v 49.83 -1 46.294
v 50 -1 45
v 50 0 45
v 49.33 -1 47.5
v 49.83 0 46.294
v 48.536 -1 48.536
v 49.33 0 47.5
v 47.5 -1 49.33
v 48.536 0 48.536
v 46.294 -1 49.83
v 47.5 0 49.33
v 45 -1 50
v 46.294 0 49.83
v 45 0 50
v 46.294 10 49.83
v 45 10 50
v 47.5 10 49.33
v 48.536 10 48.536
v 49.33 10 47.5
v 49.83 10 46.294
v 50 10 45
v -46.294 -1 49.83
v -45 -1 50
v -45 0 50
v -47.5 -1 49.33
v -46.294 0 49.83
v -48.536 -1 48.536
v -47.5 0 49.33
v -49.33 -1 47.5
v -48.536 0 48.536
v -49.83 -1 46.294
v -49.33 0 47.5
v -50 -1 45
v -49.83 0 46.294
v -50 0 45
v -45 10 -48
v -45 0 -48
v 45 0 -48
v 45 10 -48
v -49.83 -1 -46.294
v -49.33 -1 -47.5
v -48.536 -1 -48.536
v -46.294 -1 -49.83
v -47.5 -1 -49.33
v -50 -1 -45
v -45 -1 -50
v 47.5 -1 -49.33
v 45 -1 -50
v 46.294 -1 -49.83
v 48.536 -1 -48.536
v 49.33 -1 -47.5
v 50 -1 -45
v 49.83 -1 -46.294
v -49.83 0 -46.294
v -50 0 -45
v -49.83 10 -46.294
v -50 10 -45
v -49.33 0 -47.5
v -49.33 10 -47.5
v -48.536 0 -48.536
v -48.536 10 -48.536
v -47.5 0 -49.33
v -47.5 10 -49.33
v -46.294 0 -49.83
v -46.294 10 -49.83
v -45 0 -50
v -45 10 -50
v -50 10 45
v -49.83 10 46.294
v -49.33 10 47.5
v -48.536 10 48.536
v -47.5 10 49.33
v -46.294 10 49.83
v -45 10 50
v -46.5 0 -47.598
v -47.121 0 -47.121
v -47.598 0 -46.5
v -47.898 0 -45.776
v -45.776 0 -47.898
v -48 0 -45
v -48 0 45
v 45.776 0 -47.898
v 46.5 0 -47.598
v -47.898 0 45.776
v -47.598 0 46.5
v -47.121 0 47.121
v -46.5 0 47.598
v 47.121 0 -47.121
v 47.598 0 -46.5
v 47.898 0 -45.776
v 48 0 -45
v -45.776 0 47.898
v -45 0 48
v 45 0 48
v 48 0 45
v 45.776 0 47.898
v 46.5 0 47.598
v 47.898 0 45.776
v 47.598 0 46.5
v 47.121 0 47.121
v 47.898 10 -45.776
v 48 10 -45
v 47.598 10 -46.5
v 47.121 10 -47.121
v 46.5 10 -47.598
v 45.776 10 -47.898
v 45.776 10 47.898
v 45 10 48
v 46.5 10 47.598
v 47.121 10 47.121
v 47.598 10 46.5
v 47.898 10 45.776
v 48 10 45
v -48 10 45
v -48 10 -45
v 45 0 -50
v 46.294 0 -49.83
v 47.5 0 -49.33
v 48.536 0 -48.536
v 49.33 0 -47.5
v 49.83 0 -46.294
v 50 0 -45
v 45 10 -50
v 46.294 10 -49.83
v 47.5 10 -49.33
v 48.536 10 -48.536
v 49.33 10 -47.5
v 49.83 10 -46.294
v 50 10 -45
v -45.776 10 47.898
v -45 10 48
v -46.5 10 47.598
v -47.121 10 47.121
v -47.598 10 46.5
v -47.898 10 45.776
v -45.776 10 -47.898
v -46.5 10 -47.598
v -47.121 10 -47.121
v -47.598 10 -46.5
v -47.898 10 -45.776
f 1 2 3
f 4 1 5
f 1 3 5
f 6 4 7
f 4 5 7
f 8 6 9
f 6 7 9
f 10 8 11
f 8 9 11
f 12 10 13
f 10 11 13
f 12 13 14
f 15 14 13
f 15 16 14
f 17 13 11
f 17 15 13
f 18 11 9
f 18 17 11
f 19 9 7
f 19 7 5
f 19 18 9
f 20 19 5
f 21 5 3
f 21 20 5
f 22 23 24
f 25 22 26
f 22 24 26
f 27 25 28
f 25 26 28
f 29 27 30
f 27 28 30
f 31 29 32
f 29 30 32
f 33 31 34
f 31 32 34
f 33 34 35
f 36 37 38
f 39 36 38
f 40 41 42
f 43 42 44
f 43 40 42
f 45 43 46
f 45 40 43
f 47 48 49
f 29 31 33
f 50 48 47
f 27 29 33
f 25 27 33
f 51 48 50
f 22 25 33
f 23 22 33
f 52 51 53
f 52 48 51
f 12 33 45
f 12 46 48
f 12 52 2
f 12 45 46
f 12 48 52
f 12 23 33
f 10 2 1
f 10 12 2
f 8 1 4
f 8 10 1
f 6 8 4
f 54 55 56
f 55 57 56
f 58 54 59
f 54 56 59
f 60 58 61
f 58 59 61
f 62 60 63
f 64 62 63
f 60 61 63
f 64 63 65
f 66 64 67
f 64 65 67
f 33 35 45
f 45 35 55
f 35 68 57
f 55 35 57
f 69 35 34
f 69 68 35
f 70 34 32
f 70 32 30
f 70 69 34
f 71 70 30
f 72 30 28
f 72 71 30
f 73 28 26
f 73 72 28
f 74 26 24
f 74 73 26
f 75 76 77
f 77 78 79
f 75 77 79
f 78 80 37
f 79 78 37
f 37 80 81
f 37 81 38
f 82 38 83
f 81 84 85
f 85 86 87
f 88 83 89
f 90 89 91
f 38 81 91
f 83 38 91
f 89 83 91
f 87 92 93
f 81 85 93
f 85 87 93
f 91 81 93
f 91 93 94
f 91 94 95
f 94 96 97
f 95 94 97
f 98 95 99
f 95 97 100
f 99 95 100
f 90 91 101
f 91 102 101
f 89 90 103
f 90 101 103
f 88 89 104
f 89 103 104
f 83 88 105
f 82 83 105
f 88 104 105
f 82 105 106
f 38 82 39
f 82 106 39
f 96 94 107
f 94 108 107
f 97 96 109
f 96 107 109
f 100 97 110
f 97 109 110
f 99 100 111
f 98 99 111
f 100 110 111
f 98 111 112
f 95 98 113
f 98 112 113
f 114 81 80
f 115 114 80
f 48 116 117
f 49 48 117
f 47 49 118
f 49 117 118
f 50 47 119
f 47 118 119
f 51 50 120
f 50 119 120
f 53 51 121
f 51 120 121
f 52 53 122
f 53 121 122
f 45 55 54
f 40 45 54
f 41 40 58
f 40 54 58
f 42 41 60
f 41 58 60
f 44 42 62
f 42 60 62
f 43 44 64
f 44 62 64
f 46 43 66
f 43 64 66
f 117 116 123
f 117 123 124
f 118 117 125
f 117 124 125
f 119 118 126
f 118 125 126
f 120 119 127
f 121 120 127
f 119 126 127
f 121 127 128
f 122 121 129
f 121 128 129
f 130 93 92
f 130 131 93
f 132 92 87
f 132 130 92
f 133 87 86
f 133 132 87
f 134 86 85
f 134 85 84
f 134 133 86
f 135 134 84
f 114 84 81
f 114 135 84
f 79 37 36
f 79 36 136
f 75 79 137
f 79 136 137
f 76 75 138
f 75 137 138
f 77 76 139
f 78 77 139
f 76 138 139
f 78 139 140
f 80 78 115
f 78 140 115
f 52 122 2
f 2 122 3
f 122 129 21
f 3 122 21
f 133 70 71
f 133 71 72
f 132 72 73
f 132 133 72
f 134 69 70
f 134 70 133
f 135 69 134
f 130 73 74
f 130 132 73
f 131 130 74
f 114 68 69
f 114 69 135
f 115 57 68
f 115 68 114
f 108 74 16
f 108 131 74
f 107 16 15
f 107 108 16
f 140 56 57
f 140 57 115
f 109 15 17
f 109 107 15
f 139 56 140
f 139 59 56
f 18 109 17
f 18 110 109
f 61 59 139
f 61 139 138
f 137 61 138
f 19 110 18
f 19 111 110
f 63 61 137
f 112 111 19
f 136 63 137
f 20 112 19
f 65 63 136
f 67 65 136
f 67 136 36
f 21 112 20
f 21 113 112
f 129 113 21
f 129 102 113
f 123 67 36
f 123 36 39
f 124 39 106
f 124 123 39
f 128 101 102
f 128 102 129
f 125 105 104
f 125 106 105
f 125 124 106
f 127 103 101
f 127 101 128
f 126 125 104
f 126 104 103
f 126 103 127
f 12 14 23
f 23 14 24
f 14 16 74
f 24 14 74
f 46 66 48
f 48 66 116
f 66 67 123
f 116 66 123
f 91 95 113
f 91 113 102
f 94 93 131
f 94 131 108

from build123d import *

# Parameters (mm, degrees)
SKETCH1_W           = 100
SKETCH1_H           = 100
SKETCH1_W_2         = 96
SKETCH1_H_2         = 96
EXTRUDE_THIN1_DEPTH = 10
FILLET1_R           = 5
FILLET2_R           = 3
BOSS_EXTRUDE1_DEPTH = 1


with BuildPart() as part:
    # Sketch1 → Extrude-Thin1 (new body)
    with BuildSketch(Plane(origin=(0, 0, 0), x_dir=(1, 0, 0), z_dir=(0, 1, 0))):
        Rectangle(SKETCH1_W, SKETCH1_H)
        Rectangle(SKETCH1_W_2, SKETCH1_H_2, mode=Mode.SUBTRACT)
    extrude(amount=EXTRUDE_THIN1_DEPTH)

    # Fillet1
    fillet1_edges = [part.edges().sort_by_distance(p)[0] for p in [
        (50, 5, 50),
        (-50, 5, 50),
        (-50, 5, -50),
        (50, 5, -50),
    ]]
    fillet(fillet1_edges, radius=FILLET1_R)

    # Fillet2
    fillet2_edges = [part.edges().sort_by_distance(p)[0] for p in [
        (48, 5, 48),
        (48, 5, -48),
        (-48, 5, -48),
        (-48, 5, 48),
    ]]
    fillet(fillet2_edges, radius=FILLET2_R)

    # Sketch2 → Boss-Extrude1 (add)
    with BuildSketch(Plane.XZ):
        with BuildLine():
            Line((45, 50), (-45, 50))
            ThreePointArc((-45, 50), (-48.535533906, 48.535533906), (-50, 45))
            Line((-50, 45), (-50, -45))
            ThreePointArc((-50, -45), (-48.535533906, -48.535533906), (-45, -50))
            Line((-45, -50), (45, -50))
            ThreePointArc((45, -50), (48.535533906, -48.535533906), (50, -45))
            Line((50, -45), (50, 45))
            ThreePointArc((50, 45), (48.535533906, 48.535533906), (45, 50))
        make_face()
    extrude(amount=BOSS_EXTRUDE1_DEPTH)


solid = part.part
